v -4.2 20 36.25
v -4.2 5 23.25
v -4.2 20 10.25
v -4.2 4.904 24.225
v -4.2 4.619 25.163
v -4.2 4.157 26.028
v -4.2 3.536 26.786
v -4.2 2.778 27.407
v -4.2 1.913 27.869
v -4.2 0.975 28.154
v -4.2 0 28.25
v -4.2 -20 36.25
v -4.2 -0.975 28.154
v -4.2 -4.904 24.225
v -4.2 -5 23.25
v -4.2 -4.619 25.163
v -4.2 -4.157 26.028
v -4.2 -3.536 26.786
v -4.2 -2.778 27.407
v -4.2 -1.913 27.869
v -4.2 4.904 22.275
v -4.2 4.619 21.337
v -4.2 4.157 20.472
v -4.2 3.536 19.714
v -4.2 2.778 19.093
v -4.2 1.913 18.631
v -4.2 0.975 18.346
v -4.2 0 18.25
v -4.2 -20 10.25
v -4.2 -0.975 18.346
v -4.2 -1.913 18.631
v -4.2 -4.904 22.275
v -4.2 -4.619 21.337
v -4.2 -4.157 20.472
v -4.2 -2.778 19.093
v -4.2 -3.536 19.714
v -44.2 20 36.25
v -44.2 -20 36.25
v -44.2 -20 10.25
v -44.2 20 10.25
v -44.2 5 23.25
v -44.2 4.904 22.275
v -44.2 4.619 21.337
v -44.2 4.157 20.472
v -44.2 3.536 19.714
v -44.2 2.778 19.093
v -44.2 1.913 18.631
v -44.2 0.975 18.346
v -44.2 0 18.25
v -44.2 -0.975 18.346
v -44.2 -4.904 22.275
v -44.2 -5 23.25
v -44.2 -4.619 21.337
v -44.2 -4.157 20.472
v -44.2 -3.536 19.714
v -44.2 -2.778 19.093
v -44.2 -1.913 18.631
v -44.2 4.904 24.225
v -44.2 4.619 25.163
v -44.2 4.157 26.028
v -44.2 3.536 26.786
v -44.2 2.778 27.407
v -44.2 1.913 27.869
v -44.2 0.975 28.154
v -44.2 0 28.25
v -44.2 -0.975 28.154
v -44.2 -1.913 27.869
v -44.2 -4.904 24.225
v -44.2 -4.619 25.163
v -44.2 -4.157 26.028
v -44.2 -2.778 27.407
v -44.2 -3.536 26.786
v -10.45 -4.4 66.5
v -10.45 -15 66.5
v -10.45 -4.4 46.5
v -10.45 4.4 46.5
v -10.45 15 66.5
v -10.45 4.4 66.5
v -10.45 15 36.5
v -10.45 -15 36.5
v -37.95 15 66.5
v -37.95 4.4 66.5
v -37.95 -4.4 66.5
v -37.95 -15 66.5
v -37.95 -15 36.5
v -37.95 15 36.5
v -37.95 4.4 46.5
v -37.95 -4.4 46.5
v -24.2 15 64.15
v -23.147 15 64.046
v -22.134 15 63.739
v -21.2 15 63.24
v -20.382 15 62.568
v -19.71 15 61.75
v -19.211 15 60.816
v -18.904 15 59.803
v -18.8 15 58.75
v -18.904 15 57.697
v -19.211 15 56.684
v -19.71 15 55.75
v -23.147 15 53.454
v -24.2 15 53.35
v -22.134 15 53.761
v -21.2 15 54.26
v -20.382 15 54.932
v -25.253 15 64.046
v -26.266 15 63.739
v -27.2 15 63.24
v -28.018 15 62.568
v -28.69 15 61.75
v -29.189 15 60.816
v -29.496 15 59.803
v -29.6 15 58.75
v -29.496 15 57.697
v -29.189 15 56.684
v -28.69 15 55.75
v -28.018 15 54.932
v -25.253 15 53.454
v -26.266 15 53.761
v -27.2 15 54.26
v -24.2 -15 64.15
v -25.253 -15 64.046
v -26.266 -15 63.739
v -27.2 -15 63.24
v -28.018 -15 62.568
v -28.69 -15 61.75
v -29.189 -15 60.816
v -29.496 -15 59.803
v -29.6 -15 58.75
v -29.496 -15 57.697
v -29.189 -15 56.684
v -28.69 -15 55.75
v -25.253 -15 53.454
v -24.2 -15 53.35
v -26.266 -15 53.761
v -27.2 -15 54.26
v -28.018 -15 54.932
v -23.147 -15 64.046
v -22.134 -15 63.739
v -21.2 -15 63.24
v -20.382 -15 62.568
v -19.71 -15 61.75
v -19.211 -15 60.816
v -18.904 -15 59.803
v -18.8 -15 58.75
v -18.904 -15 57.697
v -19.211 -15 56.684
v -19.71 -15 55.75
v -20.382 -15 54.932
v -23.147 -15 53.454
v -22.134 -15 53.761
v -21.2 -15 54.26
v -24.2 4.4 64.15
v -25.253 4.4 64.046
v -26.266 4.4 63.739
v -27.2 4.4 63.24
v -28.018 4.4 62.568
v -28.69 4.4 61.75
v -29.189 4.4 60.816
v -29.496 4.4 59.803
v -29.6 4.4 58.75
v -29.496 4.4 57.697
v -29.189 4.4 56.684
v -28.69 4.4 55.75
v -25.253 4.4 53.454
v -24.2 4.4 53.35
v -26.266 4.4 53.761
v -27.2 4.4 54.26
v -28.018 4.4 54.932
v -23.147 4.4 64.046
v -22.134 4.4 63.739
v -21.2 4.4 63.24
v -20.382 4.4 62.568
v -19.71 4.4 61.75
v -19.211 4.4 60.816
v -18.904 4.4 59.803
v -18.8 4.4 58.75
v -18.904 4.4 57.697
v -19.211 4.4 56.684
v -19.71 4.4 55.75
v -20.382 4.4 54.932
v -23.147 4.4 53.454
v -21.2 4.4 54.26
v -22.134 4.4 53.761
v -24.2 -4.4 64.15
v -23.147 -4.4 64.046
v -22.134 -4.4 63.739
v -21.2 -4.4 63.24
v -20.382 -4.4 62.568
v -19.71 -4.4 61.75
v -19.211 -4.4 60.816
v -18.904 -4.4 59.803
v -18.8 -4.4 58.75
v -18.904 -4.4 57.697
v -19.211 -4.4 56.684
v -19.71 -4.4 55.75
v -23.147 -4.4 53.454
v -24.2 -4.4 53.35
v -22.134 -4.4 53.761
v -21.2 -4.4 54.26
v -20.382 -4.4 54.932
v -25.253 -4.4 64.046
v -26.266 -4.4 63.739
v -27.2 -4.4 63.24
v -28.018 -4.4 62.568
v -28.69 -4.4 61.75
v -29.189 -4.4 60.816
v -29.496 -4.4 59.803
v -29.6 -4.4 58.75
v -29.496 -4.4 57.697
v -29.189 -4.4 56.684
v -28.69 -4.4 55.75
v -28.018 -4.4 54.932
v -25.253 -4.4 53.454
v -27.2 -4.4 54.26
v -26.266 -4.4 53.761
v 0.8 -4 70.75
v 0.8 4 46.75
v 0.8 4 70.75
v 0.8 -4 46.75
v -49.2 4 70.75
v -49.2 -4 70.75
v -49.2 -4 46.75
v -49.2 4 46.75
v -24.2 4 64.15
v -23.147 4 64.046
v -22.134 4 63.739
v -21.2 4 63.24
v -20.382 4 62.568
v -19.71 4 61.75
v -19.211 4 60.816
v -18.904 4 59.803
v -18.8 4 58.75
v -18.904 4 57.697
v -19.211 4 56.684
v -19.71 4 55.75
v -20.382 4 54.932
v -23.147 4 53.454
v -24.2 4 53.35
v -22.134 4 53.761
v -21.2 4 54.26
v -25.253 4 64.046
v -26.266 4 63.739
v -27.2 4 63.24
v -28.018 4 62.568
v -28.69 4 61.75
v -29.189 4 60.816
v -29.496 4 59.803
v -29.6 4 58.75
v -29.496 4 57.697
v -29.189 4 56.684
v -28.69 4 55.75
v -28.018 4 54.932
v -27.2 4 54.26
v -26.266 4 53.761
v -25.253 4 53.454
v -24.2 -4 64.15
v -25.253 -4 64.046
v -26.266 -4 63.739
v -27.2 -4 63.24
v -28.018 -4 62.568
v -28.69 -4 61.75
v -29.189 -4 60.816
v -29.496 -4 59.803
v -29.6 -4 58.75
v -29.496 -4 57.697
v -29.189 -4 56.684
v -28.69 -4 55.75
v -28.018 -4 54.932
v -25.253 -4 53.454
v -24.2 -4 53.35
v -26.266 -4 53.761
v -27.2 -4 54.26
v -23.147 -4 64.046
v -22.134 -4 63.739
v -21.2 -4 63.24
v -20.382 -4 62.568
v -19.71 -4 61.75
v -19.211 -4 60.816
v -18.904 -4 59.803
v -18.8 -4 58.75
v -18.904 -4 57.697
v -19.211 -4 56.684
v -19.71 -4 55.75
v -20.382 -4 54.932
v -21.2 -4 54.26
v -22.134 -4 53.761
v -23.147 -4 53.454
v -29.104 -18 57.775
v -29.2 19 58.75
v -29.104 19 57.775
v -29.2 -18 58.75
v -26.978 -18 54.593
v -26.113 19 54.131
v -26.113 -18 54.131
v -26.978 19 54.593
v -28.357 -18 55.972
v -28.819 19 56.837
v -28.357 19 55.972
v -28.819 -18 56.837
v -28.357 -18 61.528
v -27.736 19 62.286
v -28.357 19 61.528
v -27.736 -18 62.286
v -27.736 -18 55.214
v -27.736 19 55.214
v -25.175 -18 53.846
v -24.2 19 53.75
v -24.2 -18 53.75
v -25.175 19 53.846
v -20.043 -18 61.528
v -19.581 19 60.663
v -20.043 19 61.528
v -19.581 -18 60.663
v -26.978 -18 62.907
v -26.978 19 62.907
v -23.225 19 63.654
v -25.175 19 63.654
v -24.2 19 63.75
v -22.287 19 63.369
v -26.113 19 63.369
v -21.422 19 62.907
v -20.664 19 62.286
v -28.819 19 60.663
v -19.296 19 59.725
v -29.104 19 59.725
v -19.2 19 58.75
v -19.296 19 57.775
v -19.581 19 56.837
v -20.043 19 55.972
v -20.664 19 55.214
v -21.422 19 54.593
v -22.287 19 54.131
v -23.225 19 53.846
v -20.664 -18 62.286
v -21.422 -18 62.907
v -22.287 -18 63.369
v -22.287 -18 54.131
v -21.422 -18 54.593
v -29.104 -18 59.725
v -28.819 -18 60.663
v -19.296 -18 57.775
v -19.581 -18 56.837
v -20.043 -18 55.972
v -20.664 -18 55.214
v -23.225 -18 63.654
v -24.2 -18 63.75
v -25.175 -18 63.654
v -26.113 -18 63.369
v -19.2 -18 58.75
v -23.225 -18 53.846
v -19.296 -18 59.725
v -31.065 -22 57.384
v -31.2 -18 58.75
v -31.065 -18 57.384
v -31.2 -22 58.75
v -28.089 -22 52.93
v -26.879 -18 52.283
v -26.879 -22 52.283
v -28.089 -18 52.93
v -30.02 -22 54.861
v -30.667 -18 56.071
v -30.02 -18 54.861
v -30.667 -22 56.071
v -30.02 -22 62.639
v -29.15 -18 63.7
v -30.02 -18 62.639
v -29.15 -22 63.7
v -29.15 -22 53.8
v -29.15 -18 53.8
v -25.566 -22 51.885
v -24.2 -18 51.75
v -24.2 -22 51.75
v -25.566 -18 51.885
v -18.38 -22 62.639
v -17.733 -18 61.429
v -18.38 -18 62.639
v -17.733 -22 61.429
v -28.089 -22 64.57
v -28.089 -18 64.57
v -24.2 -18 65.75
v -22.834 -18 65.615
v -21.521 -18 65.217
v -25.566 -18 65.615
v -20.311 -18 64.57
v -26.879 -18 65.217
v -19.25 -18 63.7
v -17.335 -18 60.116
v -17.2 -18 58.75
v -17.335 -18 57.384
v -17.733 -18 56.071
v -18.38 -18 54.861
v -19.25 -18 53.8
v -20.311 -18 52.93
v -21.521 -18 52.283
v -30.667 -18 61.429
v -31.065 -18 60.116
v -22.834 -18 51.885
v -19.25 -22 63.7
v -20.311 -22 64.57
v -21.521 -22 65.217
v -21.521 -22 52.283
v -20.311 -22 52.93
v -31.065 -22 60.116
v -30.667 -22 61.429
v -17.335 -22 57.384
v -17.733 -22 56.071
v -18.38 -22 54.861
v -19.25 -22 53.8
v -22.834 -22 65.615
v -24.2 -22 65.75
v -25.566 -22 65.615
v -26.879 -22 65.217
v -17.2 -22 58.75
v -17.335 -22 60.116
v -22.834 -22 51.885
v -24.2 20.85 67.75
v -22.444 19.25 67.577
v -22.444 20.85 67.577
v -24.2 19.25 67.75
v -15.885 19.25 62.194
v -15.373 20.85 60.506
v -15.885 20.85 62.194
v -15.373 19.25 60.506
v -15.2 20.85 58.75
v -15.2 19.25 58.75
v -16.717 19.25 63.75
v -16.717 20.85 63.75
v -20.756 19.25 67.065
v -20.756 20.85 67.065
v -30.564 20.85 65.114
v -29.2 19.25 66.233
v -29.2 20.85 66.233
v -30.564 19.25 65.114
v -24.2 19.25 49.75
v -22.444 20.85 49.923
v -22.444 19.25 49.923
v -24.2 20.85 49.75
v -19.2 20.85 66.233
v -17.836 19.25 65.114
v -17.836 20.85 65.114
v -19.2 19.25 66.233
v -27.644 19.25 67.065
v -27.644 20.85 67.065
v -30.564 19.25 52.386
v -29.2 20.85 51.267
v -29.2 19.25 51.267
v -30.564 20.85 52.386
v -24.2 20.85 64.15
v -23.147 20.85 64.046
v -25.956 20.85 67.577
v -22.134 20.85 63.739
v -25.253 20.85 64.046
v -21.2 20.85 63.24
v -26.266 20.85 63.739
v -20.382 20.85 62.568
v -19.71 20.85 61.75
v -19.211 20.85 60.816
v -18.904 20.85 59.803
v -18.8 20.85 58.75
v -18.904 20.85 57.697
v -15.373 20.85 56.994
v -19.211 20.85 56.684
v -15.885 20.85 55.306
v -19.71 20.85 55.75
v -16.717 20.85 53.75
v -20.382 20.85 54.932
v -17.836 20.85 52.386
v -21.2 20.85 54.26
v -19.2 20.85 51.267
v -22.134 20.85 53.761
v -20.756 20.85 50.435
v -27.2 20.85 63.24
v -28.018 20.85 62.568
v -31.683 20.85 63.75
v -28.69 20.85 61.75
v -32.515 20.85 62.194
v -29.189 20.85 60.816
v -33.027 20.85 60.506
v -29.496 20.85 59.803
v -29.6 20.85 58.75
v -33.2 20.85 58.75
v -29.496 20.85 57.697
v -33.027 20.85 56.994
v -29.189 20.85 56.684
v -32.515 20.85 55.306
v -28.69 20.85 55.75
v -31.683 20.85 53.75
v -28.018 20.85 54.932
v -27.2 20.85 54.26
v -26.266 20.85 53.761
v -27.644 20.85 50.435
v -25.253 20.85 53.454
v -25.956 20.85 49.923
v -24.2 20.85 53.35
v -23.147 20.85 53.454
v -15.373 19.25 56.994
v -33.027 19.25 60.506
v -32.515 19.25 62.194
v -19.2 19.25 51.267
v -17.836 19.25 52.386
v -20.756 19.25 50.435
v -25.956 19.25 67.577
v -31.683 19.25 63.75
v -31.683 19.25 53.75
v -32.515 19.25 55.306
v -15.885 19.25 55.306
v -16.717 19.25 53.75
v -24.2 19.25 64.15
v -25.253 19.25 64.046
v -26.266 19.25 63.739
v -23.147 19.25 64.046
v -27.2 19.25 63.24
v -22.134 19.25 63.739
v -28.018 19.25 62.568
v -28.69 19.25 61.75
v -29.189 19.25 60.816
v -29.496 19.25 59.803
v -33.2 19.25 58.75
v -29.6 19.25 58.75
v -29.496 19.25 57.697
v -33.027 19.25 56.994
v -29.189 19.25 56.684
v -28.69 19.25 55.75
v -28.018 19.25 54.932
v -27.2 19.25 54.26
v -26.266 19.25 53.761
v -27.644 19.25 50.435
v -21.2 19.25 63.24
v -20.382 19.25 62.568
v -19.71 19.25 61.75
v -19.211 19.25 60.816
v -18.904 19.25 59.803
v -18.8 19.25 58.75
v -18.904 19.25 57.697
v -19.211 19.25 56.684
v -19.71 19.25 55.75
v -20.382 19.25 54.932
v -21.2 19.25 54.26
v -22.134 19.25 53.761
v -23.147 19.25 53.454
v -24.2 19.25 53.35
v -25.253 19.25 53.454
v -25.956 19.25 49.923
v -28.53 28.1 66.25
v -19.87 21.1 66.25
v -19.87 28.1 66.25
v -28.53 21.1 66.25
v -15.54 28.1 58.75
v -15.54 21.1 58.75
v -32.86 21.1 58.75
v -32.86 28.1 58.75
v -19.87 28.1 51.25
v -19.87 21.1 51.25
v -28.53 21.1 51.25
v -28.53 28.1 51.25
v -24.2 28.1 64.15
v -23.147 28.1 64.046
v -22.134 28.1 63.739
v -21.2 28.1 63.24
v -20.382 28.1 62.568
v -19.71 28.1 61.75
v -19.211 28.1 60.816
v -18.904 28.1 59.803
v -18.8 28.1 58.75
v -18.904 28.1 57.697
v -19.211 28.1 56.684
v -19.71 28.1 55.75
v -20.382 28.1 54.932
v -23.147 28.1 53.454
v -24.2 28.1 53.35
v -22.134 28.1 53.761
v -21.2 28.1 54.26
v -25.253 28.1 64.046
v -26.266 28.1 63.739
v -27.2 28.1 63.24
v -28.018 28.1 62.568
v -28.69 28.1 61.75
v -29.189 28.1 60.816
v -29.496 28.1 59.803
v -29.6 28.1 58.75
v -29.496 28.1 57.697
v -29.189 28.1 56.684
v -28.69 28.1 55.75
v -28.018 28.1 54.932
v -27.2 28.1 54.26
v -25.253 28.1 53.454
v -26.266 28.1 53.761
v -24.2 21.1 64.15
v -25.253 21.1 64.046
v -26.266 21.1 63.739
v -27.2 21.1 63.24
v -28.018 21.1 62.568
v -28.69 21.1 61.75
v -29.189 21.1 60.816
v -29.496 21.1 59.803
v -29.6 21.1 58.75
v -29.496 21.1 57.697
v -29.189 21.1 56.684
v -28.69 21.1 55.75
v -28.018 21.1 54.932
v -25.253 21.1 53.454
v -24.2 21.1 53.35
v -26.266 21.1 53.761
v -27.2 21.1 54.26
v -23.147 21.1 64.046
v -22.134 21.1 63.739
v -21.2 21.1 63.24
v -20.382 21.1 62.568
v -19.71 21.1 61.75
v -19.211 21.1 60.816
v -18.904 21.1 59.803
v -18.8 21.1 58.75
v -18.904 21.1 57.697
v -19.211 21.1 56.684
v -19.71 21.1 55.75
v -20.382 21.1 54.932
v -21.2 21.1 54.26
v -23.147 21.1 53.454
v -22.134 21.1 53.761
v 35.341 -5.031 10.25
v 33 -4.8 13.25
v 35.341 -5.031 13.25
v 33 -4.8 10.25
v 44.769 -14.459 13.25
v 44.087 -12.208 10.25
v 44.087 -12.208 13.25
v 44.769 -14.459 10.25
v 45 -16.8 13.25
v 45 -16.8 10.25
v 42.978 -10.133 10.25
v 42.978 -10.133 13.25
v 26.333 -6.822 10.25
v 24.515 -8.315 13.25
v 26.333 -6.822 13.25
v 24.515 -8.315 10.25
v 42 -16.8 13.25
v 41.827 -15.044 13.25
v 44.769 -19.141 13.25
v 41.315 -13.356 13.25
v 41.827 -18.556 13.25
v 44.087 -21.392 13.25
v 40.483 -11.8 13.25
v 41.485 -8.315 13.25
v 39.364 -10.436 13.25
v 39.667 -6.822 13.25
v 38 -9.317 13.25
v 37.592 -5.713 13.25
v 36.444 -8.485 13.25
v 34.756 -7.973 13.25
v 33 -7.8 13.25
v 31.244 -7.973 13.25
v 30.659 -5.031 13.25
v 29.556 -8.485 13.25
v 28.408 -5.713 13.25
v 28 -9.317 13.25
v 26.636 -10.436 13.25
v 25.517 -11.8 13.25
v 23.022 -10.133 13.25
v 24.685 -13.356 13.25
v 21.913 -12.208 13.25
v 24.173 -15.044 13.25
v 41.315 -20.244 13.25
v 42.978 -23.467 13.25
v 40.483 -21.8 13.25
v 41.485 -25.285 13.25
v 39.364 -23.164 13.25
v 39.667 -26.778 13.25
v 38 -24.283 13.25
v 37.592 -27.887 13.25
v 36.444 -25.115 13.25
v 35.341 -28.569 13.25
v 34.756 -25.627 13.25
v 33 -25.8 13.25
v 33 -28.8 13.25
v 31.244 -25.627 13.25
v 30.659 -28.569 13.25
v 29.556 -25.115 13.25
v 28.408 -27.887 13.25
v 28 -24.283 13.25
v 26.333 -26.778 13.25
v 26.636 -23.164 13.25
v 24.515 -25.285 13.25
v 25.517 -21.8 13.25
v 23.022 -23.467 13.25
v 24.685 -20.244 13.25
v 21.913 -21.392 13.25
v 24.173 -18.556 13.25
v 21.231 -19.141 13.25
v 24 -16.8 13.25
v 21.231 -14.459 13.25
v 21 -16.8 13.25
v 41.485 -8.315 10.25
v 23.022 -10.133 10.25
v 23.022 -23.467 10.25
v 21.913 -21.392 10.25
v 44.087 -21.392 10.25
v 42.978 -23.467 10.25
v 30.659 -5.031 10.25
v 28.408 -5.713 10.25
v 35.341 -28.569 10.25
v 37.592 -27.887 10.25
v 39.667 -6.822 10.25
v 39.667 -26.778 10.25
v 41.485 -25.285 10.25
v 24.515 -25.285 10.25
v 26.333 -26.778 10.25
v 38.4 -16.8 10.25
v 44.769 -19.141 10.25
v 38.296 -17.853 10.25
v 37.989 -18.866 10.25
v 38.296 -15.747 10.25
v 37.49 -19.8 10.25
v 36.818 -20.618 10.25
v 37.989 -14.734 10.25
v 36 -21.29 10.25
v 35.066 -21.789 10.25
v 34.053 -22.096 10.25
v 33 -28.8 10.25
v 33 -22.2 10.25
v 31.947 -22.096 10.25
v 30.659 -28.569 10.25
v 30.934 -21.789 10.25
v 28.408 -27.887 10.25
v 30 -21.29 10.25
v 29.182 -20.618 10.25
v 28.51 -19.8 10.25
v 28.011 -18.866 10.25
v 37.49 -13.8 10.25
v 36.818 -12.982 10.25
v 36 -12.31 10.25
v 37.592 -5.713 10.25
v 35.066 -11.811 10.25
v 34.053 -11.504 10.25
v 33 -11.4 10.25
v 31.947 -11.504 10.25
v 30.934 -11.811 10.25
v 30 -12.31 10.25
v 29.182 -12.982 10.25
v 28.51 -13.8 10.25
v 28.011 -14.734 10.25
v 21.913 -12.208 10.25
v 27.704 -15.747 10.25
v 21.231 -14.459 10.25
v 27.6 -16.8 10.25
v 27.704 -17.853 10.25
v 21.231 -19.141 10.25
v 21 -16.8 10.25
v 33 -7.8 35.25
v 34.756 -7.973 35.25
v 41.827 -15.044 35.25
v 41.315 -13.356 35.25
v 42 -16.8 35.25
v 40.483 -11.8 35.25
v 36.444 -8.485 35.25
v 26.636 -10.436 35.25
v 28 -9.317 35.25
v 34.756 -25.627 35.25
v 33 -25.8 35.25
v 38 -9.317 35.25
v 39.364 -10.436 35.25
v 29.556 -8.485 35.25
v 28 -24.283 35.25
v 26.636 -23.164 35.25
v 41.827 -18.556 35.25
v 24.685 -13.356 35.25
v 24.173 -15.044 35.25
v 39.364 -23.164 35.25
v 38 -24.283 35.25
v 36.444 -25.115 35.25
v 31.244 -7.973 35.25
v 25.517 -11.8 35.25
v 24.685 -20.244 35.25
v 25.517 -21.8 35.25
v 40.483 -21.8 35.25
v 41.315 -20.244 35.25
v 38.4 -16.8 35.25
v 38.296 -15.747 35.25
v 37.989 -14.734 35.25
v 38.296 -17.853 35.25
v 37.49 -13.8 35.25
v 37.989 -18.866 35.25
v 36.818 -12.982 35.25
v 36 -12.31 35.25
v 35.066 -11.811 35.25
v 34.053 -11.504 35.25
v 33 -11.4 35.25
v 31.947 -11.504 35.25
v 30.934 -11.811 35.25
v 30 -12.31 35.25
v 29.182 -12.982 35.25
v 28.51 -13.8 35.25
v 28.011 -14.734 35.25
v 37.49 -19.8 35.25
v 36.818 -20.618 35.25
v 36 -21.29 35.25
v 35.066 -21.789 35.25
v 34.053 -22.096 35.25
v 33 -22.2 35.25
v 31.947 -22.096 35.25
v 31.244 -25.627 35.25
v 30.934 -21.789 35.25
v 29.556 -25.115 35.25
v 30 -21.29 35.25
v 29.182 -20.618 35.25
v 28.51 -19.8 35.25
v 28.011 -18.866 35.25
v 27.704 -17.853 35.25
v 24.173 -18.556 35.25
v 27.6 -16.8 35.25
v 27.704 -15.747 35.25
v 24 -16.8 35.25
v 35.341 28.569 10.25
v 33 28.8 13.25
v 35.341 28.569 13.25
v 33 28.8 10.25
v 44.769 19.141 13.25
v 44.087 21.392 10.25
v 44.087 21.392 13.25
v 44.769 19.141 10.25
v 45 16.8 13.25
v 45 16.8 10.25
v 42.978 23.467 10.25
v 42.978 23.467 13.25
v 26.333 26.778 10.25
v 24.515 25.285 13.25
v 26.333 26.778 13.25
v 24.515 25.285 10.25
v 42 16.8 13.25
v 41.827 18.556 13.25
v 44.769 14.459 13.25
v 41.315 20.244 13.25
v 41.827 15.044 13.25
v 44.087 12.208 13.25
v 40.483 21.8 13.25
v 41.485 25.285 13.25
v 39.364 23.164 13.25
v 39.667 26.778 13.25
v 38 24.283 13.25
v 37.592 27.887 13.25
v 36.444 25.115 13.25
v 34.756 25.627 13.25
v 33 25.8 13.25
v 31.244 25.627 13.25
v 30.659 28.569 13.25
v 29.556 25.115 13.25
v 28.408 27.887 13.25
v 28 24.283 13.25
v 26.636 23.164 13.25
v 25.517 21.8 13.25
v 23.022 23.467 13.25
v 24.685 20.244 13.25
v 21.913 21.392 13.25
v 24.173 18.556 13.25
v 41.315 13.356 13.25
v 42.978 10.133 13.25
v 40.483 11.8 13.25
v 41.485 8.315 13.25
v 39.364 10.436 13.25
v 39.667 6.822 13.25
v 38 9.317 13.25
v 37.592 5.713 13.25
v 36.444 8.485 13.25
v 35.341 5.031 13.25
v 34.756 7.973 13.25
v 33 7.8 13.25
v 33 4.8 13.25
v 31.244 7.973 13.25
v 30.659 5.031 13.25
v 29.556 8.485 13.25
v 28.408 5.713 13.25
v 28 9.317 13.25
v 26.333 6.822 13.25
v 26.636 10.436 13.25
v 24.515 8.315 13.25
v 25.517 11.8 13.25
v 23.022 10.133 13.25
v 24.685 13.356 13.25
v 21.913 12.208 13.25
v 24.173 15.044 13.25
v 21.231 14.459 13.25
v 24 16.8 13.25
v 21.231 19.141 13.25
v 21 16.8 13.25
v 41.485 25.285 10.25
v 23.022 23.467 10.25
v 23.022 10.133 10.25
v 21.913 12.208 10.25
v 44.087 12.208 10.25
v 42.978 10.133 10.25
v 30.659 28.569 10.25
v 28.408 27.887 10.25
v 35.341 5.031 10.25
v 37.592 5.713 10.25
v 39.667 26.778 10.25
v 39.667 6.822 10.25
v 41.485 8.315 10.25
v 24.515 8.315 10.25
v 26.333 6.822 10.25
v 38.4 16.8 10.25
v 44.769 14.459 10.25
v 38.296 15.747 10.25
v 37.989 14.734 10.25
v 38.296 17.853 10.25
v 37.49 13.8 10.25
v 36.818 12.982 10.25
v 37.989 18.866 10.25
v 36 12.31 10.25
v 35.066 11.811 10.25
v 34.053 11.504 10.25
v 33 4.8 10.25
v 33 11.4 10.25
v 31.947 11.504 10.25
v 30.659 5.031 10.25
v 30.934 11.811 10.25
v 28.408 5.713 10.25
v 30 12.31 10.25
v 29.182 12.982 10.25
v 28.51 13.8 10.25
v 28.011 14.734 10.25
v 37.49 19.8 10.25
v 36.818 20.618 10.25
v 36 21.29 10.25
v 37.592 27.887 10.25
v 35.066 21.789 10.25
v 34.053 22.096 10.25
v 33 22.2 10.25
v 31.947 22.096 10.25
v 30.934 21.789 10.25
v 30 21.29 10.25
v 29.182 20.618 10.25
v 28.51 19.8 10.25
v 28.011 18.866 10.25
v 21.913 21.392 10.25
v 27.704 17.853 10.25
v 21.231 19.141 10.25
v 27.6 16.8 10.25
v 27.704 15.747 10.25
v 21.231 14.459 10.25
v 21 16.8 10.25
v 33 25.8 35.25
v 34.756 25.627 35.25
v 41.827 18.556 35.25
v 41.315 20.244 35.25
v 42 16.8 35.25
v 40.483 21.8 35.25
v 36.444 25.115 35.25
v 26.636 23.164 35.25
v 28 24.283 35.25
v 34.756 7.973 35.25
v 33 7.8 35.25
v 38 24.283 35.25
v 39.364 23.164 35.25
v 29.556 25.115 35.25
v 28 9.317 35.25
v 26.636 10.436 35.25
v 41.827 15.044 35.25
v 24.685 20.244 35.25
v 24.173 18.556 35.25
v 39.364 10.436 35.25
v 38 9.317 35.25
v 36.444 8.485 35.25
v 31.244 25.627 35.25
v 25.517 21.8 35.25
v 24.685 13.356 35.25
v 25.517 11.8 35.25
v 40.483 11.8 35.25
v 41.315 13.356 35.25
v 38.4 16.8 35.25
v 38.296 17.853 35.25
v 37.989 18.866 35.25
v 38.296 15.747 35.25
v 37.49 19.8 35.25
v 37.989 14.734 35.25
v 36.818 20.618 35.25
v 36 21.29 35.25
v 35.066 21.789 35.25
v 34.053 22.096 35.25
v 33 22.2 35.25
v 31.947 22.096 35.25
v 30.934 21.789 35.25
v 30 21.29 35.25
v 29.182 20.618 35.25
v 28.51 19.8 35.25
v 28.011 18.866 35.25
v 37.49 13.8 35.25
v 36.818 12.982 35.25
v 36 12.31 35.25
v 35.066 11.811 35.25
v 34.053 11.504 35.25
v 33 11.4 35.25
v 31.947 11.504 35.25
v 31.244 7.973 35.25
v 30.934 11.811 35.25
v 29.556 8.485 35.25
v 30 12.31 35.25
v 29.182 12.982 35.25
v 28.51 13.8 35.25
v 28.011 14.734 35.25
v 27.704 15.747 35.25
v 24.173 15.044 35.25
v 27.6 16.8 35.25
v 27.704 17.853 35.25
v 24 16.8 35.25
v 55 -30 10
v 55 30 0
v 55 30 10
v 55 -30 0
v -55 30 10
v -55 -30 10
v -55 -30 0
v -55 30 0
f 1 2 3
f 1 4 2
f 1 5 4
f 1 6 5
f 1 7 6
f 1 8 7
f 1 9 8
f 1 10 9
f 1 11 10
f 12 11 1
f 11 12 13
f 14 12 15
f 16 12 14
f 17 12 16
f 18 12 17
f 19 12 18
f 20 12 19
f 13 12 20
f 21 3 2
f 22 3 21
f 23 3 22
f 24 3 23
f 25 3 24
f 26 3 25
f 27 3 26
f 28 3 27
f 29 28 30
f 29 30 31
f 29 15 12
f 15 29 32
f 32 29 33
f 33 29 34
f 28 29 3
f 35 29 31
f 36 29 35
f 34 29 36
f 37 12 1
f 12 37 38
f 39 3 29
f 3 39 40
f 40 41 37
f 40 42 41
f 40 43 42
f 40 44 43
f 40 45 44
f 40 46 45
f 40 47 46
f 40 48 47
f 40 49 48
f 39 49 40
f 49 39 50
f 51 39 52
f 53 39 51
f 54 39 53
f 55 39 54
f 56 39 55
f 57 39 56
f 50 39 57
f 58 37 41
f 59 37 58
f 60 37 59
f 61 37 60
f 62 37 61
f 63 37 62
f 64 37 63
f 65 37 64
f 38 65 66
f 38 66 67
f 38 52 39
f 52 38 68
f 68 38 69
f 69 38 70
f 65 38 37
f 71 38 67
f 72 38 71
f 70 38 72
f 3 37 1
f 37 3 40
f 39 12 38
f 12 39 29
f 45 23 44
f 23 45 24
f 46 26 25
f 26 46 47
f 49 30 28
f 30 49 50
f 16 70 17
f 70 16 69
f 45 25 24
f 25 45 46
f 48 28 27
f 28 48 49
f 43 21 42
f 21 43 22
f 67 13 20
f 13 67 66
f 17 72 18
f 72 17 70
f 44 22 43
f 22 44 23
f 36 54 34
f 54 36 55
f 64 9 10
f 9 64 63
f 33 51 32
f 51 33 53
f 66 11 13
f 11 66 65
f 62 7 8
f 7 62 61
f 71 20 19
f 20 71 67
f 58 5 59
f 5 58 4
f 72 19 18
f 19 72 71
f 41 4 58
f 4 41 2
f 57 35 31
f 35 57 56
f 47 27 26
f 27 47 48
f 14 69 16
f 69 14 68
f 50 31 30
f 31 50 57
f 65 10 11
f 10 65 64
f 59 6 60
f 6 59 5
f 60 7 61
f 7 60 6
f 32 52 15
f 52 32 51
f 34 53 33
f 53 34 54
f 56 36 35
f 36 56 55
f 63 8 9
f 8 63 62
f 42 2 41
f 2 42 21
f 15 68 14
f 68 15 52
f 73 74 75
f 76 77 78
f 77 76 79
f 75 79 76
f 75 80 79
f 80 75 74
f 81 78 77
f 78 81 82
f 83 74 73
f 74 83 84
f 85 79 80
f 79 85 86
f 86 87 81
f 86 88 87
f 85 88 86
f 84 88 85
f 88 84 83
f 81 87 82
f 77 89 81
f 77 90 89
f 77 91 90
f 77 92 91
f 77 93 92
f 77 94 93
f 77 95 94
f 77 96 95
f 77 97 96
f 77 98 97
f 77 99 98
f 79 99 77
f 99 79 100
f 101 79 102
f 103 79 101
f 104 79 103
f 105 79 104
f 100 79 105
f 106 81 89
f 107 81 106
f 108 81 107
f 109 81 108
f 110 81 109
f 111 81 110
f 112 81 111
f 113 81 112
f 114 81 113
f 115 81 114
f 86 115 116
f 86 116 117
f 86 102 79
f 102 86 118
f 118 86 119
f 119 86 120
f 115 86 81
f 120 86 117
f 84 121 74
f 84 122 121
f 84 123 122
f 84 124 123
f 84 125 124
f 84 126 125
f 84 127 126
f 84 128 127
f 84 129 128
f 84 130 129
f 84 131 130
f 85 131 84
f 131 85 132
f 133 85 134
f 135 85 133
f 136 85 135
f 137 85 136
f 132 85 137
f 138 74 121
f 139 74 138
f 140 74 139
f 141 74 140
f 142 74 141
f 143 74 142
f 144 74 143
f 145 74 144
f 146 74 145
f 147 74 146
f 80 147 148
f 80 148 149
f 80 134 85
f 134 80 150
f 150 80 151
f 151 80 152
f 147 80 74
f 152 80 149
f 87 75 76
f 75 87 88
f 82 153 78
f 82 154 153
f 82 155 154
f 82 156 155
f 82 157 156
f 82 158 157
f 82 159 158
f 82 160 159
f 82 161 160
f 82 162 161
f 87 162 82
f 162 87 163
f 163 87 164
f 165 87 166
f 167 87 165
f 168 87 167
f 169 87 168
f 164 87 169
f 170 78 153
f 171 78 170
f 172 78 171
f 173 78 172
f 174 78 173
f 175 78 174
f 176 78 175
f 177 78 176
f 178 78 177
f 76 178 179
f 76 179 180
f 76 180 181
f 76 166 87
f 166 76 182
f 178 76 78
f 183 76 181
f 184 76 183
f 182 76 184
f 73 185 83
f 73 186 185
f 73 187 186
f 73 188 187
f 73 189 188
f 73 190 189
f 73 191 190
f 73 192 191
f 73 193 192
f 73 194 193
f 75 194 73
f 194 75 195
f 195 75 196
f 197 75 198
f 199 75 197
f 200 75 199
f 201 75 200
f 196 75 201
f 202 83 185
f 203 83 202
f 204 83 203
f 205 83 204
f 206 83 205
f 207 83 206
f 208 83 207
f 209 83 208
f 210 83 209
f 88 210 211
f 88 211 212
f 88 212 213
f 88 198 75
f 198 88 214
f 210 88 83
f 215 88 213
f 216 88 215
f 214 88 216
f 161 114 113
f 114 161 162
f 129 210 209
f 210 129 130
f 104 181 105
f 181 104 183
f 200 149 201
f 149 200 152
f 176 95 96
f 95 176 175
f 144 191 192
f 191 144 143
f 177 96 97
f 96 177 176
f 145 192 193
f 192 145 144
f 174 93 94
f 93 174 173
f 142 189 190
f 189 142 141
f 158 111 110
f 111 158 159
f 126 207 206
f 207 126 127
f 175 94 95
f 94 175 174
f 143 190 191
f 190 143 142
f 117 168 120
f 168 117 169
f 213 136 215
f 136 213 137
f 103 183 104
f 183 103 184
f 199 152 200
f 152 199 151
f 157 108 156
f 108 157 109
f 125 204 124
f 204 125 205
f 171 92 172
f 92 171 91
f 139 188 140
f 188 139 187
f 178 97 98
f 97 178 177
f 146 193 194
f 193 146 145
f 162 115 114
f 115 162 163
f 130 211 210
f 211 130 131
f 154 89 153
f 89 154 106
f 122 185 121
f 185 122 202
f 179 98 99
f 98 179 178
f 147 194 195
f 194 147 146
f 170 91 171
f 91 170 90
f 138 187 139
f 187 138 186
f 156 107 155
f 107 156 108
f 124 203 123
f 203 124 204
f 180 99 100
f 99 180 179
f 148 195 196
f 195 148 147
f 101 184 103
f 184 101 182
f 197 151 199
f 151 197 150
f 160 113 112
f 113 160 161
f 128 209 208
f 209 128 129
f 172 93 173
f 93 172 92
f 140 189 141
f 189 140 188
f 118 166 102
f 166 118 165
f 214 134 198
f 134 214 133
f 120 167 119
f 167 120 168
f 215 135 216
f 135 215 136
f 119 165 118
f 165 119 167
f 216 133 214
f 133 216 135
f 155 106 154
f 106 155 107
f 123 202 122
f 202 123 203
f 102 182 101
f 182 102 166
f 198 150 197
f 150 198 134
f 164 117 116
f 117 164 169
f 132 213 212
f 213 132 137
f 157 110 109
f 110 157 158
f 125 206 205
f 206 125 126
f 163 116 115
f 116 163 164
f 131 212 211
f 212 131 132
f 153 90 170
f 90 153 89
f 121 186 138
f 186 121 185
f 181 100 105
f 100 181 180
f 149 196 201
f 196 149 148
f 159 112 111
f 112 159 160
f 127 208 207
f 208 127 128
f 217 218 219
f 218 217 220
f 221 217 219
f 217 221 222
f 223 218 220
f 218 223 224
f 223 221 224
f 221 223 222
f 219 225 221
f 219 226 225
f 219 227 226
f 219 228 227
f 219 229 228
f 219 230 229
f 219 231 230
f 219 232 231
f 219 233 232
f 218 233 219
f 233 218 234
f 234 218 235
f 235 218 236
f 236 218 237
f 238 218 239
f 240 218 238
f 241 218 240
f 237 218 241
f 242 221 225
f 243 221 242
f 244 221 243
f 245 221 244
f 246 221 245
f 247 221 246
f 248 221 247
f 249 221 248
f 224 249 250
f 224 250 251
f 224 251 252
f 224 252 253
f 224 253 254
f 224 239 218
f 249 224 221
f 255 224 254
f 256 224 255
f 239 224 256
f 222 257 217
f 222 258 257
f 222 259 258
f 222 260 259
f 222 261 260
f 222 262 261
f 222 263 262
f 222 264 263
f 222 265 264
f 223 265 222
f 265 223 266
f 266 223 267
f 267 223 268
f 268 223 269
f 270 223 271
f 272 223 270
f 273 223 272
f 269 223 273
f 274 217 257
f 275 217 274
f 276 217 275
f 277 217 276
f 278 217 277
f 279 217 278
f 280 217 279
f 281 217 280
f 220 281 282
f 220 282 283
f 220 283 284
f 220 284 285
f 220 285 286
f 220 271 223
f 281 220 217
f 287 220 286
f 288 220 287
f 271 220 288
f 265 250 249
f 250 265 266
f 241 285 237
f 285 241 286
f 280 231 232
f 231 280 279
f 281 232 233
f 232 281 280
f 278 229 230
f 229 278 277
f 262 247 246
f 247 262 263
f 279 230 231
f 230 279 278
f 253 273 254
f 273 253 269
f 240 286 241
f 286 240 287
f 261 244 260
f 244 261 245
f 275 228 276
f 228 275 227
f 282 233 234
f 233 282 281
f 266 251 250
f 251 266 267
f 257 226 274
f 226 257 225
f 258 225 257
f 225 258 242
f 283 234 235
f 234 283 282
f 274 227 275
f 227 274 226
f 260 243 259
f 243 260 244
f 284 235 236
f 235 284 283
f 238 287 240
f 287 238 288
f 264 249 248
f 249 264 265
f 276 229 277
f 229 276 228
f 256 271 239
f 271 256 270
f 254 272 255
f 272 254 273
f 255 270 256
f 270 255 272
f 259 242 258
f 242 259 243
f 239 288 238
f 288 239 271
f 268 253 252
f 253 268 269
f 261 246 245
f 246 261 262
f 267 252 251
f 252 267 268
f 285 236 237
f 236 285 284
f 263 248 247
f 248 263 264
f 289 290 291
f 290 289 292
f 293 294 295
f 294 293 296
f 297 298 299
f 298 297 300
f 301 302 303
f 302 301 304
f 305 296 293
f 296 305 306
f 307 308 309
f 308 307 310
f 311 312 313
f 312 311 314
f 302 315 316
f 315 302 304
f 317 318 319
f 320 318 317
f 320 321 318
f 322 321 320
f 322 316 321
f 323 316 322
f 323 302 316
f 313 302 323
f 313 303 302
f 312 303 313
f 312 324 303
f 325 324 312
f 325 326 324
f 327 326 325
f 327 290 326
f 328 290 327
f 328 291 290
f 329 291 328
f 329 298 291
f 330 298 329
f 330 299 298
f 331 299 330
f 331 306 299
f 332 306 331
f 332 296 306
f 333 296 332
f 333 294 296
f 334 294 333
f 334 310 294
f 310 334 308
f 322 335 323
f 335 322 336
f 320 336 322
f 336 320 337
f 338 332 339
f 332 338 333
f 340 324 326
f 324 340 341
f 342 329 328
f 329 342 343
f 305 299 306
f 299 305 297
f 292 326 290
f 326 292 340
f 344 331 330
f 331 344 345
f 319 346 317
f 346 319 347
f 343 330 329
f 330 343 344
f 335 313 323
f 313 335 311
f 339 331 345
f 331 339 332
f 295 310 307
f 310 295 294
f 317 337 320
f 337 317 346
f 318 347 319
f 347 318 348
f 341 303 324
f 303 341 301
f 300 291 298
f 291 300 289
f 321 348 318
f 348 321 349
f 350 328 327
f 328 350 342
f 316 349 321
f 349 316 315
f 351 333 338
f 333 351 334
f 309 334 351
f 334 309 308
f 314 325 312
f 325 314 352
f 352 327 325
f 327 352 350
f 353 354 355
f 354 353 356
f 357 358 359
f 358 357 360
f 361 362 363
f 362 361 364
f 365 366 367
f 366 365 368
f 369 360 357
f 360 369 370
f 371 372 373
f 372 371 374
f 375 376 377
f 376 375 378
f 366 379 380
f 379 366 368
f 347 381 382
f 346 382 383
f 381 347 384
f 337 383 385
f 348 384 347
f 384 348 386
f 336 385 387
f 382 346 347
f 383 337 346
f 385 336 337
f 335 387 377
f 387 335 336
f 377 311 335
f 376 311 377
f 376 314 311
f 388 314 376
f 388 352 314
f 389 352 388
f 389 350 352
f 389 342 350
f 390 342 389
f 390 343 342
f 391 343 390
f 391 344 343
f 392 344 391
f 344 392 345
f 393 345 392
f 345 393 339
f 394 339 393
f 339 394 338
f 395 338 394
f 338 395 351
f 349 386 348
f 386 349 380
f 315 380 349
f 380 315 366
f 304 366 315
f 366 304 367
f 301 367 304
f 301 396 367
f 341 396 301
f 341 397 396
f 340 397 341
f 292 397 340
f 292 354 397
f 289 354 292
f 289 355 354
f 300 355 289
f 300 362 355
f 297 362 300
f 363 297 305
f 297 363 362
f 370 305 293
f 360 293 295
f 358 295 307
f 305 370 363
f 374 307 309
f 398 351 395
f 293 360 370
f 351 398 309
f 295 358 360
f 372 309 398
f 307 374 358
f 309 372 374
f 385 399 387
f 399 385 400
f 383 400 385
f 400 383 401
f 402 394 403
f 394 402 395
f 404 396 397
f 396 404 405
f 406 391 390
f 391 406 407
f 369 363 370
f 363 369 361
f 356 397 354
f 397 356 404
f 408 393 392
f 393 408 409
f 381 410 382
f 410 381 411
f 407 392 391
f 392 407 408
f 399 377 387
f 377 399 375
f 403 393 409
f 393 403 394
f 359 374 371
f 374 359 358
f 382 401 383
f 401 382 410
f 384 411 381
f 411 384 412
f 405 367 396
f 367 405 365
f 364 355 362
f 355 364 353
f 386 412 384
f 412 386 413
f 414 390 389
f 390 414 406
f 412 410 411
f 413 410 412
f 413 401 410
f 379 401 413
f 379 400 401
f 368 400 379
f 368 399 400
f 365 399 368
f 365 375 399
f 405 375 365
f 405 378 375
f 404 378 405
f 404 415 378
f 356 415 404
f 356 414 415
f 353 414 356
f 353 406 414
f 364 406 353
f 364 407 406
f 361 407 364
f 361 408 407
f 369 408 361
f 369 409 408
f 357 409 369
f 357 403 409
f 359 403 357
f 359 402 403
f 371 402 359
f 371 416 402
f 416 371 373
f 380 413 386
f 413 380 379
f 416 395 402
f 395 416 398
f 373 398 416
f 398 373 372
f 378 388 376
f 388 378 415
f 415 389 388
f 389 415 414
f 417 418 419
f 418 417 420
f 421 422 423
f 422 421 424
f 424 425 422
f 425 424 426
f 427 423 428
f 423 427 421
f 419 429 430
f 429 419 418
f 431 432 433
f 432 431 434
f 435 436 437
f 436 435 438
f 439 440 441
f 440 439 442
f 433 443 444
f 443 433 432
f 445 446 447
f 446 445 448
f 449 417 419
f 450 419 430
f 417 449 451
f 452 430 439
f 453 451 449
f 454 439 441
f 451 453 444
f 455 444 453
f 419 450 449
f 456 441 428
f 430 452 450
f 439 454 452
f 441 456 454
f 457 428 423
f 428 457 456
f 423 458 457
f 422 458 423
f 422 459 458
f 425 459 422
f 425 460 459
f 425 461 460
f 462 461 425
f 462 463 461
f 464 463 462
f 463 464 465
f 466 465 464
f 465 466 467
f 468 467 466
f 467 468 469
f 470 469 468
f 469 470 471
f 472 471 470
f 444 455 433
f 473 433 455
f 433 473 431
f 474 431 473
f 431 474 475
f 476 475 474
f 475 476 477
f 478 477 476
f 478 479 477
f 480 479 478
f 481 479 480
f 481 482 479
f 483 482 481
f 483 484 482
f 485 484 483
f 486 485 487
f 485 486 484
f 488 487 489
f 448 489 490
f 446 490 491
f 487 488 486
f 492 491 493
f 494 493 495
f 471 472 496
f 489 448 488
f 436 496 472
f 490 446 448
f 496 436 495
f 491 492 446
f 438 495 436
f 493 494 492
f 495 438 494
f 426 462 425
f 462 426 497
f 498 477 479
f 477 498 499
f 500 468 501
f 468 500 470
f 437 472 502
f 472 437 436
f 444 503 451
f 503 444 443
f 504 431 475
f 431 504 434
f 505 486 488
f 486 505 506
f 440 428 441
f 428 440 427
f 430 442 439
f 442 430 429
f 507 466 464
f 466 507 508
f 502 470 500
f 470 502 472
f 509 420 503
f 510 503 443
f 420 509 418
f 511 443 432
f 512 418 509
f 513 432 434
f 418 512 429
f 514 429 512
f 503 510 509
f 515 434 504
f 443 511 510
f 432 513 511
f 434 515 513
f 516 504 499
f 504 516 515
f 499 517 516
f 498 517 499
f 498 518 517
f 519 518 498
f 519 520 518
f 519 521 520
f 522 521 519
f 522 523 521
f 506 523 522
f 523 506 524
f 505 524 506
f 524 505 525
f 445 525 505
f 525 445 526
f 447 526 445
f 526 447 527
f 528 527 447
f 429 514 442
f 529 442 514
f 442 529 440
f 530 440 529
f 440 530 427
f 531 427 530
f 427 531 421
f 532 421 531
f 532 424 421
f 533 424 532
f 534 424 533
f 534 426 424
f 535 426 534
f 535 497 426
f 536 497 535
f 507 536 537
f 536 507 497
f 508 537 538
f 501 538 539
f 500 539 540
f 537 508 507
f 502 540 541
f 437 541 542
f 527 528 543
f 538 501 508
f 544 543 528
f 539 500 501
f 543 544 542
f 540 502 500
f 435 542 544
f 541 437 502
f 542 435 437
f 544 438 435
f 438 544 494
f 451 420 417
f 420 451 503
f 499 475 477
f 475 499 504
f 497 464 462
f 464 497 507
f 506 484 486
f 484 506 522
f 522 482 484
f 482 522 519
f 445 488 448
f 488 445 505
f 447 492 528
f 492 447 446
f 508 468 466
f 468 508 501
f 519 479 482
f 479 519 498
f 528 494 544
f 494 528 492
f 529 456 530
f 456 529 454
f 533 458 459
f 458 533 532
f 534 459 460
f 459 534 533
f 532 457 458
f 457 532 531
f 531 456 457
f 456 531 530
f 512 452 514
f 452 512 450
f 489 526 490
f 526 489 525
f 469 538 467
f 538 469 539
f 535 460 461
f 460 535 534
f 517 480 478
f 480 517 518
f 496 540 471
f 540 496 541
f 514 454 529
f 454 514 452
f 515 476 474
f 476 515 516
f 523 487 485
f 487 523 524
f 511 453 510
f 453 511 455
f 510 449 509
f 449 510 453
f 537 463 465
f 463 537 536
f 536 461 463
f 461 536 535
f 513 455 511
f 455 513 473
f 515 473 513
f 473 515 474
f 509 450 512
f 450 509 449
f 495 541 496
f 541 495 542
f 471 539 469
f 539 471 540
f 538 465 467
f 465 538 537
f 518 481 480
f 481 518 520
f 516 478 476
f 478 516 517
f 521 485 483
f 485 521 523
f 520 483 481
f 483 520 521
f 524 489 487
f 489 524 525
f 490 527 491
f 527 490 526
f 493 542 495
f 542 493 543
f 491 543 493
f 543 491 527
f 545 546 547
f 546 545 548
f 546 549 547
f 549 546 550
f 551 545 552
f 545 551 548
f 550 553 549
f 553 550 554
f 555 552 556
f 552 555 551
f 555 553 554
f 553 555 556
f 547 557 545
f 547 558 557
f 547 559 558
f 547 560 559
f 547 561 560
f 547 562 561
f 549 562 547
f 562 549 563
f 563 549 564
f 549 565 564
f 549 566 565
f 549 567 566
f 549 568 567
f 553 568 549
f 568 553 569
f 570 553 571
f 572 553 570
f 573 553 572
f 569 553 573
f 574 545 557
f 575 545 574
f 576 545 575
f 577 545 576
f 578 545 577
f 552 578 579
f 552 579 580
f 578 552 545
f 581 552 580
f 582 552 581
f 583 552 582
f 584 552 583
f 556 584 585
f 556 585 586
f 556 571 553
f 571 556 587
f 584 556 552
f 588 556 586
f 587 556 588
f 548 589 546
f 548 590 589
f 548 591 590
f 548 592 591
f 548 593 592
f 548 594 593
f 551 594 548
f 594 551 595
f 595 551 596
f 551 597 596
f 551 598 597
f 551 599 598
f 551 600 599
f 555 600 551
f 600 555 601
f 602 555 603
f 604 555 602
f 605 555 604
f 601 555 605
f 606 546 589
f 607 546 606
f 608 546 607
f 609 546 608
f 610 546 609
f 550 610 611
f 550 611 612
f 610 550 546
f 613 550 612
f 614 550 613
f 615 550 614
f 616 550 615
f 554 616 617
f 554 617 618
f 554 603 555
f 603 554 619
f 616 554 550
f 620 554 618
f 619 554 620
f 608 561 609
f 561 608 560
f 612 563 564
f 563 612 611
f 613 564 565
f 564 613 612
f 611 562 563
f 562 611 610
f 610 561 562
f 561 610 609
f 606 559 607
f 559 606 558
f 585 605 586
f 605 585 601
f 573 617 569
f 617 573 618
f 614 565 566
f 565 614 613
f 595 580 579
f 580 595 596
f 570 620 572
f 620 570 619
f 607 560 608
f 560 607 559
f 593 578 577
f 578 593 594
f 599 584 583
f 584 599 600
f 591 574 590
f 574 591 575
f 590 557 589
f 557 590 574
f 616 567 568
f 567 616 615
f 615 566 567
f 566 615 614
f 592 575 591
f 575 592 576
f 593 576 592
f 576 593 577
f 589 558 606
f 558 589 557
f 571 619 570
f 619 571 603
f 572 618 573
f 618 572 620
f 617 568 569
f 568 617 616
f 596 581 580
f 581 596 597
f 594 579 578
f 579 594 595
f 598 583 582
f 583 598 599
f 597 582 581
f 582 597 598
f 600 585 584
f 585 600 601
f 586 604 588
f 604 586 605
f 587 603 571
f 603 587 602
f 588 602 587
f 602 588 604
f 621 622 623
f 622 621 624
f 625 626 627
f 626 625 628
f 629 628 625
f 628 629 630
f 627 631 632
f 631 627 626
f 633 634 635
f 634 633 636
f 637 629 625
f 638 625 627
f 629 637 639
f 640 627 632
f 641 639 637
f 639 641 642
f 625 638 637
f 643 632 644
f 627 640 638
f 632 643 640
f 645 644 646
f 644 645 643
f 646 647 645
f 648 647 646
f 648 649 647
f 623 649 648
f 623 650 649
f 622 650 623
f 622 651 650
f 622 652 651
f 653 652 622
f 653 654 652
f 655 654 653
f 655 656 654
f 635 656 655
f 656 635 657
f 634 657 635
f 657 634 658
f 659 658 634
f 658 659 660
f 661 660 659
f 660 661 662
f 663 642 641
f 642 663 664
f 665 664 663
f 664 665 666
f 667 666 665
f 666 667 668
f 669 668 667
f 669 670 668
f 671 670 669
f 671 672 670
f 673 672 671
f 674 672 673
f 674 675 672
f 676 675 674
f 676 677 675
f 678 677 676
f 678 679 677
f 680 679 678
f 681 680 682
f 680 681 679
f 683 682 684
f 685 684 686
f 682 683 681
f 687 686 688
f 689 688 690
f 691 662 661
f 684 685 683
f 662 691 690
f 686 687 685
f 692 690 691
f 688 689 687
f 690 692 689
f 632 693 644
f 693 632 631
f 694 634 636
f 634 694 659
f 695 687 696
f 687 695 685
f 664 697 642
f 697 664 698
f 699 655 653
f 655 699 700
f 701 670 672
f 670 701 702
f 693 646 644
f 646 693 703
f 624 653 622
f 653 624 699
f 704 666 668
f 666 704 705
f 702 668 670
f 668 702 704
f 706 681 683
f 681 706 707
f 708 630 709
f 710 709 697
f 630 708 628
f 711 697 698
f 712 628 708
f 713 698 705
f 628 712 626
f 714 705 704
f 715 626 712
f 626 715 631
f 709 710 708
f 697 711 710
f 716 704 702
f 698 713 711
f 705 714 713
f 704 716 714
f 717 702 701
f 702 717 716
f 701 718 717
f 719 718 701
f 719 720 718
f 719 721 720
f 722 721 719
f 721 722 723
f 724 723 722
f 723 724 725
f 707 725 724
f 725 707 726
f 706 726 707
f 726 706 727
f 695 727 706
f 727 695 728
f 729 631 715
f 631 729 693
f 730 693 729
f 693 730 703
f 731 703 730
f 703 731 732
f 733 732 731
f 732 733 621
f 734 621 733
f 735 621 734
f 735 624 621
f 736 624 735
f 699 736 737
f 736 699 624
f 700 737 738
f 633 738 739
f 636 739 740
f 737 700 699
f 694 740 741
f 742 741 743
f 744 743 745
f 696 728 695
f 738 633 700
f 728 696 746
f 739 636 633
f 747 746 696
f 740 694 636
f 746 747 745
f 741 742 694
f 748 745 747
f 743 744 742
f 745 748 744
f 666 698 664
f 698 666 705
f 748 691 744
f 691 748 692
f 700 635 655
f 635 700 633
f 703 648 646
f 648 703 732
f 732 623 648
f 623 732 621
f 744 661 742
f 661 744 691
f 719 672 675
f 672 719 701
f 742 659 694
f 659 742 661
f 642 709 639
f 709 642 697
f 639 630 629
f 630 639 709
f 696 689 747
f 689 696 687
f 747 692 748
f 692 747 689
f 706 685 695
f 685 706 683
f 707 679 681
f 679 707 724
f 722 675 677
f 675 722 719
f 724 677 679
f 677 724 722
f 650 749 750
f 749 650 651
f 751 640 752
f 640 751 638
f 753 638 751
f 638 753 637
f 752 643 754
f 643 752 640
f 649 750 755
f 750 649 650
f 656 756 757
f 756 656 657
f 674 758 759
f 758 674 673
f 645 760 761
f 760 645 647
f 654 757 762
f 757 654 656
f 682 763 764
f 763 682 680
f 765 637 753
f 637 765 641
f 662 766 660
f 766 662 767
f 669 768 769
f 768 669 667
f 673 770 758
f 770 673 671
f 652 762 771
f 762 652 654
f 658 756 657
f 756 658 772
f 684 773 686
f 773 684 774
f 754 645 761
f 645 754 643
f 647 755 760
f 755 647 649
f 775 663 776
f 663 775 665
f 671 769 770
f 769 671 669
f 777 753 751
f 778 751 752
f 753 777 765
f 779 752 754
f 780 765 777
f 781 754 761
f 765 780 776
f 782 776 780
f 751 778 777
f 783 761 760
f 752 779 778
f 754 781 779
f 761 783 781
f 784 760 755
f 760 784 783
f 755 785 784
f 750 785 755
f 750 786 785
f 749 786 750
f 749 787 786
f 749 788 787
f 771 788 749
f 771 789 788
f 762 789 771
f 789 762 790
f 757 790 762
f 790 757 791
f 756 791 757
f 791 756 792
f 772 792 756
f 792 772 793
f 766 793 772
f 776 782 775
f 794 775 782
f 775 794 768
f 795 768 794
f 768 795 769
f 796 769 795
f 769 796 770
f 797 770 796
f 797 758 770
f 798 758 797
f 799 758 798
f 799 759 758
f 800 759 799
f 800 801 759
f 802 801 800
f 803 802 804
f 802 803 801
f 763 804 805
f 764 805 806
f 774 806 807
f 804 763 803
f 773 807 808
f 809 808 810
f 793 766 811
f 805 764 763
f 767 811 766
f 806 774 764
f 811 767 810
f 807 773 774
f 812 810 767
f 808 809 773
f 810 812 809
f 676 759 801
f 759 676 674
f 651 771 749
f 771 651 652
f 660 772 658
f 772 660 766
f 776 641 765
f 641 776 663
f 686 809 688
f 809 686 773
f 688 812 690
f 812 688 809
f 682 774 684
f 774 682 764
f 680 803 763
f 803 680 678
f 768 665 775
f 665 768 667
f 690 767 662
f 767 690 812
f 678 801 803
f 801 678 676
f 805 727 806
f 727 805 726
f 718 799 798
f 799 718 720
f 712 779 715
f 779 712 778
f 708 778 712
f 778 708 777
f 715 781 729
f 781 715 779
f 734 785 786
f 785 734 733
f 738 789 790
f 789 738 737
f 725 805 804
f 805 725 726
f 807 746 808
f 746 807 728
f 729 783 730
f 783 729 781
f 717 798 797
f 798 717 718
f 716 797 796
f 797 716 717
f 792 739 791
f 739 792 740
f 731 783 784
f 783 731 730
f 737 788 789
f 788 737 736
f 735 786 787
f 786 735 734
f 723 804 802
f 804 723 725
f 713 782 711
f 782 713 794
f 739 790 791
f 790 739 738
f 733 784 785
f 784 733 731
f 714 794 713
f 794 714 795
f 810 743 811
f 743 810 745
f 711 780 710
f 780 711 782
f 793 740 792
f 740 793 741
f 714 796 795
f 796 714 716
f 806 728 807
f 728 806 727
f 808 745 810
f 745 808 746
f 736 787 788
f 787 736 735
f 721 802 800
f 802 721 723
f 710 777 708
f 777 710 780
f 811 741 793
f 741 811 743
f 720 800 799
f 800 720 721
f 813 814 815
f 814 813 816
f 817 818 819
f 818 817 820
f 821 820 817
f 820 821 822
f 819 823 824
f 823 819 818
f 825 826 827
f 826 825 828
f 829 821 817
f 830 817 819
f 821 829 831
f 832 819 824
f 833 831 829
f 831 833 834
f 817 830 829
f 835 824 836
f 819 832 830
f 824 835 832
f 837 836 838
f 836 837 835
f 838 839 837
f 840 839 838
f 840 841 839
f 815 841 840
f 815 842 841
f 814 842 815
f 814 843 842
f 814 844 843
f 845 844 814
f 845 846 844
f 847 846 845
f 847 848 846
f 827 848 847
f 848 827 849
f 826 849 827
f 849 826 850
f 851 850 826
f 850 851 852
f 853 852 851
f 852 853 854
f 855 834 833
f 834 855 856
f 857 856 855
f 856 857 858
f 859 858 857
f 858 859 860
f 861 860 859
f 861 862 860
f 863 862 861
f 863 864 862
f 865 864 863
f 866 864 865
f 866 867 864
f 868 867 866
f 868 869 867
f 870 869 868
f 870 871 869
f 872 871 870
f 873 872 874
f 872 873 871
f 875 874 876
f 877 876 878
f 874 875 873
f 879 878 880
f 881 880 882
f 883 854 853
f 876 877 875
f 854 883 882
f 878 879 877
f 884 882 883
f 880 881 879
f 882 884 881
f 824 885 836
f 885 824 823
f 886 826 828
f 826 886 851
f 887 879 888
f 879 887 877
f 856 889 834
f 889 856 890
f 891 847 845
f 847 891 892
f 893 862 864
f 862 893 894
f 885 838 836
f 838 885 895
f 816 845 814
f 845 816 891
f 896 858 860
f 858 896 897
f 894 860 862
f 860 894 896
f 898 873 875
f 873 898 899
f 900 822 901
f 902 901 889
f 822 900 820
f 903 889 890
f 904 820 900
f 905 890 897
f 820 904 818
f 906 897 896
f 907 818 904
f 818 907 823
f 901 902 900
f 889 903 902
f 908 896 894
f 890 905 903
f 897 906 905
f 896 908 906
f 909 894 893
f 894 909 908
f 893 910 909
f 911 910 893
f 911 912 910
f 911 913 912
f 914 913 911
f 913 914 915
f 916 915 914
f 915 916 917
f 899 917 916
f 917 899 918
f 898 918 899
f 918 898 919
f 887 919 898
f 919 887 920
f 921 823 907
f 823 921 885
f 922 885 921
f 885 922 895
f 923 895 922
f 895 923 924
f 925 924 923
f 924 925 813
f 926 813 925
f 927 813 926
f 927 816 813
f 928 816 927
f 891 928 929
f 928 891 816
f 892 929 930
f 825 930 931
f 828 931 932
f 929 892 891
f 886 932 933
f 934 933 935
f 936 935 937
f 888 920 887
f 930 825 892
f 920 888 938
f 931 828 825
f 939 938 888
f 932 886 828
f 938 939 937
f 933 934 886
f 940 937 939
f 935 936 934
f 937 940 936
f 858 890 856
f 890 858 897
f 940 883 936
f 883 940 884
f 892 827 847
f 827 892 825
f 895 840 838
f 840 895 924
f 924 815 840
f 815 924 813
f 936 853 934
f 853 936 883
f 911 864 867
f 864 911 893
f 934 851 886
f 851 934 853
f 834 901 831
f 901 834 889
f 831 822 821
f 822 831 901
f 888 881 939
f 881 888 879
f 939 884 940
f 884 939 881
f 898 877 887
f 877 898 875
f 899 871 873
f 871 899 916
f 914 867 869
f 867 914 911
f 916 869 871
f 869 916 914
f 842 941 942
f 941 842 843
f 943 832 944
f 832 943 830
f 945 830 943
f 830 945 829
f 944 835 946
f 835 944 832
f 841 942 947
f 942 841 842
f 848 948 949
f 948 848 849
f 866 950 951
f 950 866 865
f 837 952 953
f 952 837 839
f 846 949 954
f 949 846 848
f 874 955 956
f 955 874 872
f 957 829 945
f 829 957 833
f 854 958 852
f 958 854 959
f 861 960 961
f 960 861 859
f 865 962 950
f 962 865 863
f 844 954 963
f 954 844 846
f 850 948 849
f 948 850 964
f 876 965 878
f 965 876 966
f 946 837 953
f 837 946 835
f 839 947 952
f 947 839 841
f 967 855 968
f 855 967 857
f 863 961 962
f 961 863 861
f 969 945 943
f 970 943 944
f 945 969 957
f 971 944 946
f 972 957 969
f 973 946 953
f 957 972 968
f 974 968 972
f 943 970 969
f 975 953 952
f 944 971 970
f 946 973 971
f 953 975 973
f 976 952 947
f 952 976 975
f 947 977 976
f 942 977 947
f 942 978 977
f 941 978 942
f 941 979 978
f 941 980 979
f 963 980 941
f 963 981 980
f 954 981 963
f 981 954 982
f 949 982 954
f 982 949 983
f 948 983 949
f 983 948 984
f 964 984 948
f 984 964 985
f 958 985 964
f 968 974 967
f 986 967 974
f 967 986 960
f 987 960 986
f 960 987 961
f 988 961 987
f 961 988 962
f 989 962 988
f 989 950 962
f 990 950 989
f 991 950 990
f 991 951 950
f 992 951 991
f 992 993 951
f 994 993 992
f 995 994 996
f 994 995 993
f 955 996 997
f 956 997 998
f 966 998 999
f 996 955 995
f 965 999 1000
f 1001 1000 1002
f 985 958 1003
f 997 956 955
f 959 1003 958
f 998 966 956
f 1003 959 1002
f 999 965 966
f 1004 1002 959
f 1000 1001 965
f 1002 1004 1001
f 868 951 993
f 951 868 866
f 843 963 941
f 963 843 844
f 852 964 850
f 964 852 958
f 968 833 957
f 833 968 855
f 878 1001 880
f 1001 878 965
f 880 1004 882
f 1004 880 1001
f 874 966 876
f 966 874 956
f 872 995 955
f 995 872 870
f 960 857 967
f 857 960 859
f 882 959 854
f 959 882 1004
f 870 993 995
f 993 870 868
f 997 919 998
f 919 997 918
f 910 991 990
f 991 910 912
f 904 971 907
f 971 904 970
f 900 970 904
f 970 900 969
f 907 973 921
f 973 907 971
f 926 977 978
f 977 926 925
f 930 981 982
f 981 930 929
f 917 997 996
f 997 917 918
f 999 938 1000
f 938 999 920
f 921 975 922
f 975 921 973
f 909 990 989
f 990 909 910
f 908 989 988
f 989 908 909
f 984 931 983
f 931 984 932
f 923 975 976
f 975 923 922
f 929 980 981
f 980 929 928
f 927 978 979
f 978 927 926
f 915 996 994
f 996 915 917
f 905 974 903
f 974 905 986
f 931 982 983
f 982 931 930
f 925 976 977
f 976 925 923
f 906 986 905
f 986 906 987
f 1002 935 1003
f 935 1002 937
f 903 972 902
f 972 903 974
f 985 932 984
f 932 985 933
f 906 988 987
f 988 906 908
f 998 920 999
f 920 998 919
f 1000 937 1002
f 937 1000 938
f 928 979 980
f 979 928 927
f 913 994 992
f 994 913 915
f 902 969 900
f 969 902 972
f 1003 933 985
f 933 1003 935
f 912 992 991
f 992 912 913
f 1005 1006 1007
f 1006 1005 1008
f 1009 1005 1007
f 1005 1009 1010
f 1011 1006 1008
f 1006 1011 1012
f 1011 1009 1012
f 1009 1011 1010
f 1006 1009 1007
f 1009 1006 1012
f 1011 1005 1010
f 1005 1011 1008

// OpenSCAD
$fn = 32;

// ------------------------------------------------------------------------
// Indexing jig: plate 110 x 60 mm, pin d10
// Every part is its own module, assembly() places every instance.
// ------------------------------------------------------------------------

// --- part 1 ---
module jig_plate() {
  difference() {
    translate([-55, -30, 0]) cube([110, 60, 10]);
  }
}

// --- part 2 ---
module locator_block() {
  difference() {
    translate([-20, -20, 0]) cube([40, 40, 26]);
    translate([0, 0, 13]) rotate([0, 90, 0]) cylinder(h = 42, d = 10, center = true);
  }
}

// --- part 3 ---
module index_fork() {
  difference() {
    translate([-13.75, -15, 0]) cube([27.5, 30, 30]);
    translate([-14.75, -4.4, 10]) cube([29.5, 8.8, 21]);
    translate([0, 0, 22.25]) rotate([90, 0, 0]) cylinder(h = 32, d = 10.8, center = true);
  }
}

// --- part 4 ---
module index_arm() {
  difference() {
    translate([-25, -4, 0]) cube([50, 8, 24]);
    translate([0, 0, 12]) rotate([90, 0, 0]) cylinder(h = 10, d = 10.8, center = true);
  }
}

// --- part 5 ---
module index_pin() {
  rotate([0, 90, 0]) cylinder(h = 38, d = 10, center = true);
  translate([-22, 0, 0]) rotate([0, 90, 0]) cylinder(h = 4, d = 14);
}

// --- part 6 ---
module pin_washer() {
  difference() {
      translate([0, 0, 0]) cylinder(h = 1.6, d = 18);
      translate([0, 0, -1]) cylinder(h = 3.6, d = 10.8);
    }
}

// --- part 7 ---
module lock_nut() {
  difference() {
    linear_extrude(height = 7) polygon(points = [[8.66, 0], [4.33, 7.5], [-4.33, 7.5], [-8.66, 0], [-4.33, -7.5], [4.33, -7.5]]);
    translate([0, 0, -1]) cylinder(h = 9, d = 10.8);
  }
}

// --- part 8 ---
module guide_bush_a() {
  difference() {
    union() {
      cylinder(h = 3, d = 24);
      translate([0, 0, 3]) cylinder(h = 22, d = 18);
    }
    translate([0, 0, -1]) cylinder(h = 27, d = 10.8);
  }
}

// --- part 9 ---
module guide_bush_b() {
  difference() {
    union() {
      cylinder(h = 3, d = 24);
      translate([0, 0, 3]) cylinder(h = 22, d = 18);
    }
    translate([0, 0, -1]) cylinder(h = 27, d = 10.8);
  }
}

// --- assembly ---
module assembly() {
  color([0.80, 0.24, 0.20]) translate([0, 0, 0]) rotate([0, 0, 0]) jig_plate();
  color([0.20, 0.45, 0.75]) translate([-24.2, 0, 10.25]) rotate([0, 0, 0]) locator_block();
  color([0.25, 0.62, 0.32]) translate([-24.2, 0, 36.5]) rotate([0, 0, 0]) index_fork();
  color([0.92, 0.70, 0.18]) translate([-24.2, 0, 46.75]) rotate([0, 0, 0]) index_arm();
  color([0.58, 0.35, 0.70]) translate([-24.2, 0, 58.75]) rotate([0, 0, 90]) index_pin();
  color([0.16, 0.66, 0.66]) translate([-24.2, 20.85, 58.75]) rotate([90, 0, 0]) pin_washer();
  color([0.85, 0.48, 0.18]) translate([-24.2, 28.1, 58.75]) rotate([90, 0, 0]) lock_nut();
  color([0.55, 0.60, 0.65]) translate([33, -16.8, 10.25]) rotate([0, 0, 0]) guide_bush_a();
  color([0.75, 0.30, 0.55]) translate([33, 16.8, 10.25]) rotate([0, 0, 0]) guide_bush_b();
}

assembly();
